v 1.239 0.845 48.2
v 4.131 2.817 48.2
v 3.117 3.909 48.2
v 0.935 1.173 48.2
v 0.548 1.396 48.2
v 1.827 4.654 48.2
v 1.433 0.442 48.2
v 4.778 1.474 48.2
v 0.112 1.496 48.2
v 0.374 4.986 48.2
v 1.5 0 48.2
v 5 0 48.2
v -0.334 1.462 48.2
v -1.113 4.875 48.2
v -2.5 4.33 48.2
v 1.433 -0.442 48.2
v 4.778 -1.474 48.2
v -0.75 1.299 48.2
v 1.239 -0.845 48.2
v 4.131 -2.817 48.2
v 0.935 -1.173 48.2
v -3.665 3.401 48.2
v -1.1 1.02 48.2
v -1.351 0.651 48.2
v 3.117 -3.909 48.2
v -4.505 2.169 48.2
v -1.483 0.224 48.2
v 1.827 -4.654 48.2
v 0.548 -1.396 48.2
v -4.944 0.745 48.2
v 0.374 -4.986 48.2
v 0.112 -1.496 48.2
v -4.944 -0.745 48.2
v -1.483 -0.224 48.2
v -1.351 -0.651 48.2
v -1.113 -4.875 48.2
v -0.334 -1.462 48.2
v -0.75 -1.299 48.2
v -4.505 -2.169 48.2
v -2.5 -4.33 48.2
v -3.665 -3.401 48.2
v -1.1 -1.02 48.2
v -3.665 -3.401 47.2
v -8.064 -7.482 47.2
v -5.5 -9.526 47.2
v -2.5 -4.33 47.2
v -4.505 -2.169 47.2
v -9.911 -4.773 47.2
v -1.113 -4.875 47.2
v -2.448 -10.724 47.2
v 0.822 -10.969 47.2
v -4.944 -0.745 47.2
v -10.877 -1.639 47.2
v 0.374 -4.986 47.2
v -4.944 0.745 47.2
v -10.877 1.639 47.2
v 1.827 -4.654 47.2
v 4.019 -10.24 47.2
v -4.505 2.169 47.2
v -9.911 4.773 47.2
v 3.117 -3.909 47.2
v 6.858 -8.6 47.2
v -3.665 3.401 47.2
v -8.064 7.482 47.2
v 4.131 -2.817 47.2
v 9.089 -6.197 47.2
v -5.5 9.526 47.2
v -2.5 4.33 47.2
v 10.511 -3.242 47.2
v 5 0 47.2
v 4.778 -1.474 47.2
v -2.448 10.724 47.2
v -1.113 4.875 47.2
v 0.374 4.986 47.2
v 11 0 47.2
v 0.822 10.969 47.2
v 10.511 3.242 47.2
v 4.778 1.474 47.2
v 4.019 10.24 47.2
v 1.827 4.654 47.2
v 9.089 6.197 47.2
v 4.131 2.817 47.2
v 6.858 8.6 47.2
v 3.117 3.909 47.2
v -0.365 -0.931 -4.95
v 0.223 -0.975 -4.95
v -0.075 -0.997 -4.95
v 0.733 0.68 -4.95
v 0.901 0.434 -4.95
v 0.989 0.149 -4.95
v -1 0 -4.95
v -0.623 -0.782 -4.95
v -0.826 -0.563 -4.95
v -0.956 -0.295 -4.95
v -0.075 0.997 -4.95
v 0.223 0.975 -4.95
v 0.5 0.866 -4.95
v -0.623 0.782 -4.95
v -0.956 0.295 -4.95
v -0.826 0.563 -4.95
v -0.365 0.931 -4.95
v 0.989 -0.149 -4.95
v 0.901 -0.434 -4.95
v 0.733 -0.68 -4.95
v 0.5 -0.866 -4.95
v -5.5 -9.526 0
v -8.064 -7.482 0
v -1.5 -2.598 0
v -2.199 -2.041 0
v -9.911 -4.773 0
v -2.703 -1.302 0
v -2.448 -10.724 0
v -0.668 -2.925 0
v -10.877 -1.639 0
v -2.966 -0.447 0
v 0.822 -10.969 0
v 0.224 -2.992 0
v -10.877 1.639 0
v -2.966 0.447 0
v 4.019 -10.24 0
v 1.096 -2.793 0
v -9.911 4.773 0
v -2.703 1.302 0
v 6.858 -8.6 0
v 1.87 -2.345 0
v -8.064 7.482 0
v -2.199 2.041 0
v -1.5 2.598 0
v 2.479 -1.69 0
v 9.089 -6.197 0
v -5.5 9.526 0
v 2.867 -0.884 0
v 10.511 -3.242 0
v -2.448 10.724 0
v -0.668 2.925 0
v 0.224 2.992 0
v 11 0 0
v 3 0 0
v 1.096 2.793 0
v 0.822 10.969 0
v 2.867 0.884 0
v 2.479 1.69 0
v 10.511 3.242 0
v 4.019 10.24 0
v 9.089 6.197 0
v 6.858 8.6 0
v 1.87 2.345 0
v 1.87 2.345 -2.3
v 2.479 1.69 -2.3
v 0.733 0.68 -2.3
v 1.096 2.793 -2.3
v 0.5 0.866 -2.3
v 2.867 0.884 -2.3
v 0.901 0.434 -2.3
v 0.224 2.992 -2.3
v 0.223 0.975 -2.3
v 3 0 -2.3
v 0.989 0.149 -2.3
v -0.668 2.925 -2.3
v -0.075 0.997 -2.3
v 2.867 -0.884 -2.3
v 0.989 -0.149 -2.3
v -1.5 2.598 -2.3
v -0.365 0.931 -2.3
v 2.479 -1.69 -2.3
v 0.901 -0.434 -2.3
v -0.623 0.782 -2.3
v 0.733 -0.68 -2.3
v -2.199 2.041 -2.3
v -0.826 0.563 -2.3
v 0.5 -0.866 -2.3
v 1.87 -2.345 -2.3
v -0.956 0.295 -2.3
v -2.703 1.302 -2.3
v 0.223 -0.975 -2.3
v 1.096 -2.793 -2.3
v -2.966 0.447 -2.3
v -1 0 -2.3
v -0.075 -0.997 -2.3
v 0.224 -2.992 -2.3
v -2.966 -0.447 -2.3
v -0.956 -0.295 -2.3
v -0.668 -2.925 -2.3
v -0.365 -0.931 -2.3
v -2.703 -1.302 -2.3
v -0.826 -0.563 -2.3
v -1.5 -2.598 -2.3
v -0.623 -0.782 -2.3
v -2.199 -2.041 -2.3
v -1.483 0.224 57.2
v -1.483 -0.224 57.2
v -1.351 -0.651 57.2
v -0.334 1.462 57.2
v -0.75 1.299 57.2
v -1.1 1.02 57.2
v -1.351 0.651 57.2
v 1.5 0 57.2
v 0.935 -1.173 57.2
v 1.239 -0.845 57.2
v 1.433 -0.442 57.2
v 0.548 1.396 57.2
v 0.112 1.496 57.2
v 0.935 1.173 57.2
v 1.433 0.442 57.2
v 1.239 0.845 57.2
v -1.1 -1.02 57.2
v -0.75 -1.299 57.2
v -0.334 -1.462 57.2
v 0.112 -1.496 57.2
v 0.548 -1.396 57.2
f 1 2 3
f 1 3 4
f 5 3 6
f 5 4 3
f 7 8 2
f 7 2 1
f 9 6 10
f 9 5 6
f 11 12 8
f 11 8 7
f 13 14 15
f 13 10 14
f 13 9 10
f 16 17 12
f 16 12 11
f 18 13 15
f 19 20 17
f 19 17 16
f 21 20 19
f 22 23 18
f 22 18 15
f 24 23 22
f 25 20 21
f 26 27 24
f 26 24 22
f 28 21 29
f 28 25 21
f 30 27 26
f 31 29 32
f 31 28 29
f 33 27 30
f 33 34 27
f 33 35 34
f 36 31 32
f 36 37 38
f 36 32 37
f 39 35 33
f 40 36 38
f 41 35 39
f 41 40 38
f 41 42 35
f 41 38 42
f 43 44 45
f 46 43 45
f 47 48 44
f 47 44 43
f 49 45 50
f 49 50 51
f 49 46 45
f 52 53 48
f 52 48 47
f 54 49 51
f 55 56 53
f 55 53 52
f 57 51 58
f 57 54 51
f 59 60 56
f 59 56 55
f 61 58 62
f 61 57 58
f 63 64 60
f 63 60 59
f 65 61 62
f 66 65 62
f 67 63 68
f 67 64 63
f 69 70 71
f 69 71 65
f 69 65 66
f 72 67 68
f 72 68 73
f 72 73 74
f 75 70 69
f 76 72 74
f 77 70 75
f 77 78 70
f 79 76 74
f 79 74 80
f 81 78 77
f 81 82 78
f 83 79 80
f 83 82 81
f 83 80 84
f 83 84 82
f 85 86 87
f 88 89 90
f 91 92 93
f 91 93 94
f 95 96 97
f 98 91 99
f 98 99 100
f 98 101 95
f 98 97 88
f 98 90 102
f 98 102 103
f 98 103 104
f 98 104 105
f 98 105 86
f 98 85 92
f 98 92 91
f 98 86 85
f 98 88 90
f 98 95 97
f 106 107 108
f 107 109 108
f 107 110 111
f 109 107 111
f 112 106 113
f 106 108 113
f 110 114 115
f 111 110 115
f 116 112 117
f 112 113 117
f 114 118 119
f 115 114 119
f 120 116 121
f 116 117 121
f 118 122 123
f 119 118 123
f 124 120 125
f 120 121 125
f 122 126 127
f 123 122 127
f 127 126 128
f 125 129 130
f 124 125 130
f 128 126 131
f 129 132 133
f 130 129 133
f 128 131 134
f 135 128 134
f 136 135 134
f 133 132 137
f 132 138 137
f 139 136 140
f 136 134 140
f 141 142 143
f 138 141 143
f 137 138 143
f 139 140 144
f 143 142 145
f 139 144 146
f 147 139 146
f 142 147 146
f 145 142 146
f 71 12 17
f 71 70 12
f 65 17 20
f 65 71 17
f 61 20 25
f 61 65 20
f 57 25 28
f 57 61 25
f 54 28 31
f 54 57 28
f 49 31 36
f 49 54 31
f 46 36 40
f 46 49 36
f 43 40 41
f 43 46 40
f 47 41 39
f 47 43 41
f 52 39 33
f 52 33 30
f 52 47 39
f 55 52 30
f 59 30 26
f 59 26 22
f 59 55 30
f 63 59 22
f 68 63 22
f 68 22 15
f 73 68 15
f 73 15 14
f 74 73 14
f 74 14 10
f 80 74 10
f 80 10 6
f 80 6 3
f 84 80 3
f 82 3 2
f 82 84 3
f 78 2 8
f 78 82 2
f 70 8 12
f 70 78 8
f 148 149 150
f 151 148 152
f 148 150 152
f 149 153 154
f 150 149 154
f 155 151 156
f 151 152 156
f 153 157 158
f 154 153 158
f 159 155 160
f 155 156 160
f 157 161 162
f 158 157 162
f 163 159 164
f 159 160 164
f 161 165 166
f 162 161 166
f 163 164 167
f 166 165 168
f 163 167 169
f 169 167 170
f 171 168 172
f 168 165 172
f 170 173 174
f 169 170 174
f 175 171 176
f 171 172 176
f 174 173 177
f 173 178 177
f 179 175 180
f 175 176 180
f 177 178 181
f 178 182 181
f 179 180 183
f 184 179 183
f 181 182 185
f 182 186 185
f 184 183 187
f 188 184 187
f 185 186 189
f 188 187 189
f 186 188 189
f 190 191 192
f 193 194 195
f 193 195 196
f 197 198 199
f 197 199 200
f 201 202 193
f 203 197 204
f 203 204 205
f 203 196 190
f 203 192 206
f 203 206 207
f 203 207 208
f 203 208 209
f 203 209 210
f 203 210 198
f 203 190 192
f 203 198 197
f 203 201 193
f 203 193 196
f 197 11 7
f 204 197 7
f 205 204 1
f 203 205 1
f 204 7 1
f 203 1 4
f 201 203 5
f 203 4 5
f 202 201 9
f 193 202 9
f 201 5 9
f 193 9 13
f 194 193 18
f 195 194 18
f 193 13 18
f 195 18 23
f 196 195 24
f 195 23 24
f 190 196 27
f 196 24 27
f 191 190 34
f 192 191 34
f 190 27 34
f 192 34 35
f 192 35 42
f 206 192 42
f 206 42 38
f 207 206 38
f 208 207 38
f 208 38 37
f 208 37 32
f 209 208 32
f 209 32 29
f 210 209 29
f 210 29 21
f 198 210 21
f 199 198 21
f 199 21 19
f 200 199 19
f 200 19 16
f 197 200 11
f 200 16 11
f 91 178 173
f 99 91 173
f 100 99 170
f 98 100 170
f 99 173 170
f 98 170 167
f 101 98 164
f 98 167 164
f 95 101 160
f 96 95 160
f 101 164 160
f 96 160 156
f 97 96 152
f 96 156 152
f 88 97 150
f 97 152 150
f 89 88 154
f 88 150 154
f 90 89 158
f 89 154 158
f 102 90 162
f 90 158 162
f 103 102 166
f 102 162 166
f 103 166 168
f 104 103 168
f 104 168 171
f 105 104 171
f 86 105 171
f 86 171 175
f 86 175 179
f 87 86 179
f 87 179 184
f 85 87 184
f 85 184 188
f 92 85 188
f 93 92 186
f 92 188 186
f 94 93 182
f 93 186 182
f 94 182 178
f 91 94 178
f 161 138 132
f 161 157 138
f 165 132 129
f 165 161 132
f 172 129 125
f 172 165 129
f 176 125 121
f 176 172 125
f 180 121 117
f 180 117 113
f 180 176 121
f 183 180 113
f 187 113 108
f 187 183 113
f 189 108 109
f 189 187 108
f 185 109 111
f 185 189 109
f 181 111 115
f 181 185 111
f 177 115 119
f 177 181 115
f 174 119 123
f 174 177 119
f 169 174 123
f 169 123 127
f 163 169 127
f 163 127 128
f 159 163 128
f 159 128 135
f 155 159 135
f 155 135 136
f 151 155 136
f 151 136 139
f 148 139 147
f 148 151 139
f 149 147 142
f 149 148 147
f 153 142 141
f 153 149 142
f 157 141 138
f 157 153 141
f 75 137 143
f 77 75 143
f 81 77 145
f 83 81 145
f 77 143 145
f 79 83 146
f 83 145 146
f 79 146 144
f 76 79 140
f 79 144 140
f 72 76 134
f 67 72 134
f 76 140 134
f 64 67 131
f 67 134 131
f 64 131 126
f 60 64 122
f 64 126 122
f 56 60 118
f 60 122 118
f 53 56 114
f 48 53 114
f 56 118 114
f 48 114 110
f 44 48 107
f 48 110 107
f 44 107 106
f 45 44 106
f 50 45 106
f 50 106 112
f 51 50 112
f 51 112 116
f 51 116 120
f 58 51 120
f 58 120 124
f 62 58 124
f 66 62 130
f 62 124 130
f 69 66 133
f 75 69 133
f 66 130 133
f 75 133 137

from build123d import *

# Parameters (mm, degrees)
SKETCH1_R           = 11
BOSS_EXTRUDE1_DEPTH = 47.2
SKETCH2_W           = 1
SKETCH2_H           = 5
SKETCH3_W           = 2.3
SKETCH3_H           = 3
SKETCH4_R           = 1.5
BOSS_EXTRUDE2_DEPTH = 9
SKETCH5_R           = 1
BOSS_EXTRUDE3_DEPTH = 2.65


with BuildPart() as part:
    # Sketch1 → Boss-Extrude1 (new body)
    with BuildSketch(Plane.XY):
        Circle(SKETCH1_R)
    extrude(amount=BOSS_EXTRUDE1_DEPTH)

    # Sketch2 → Revolve1 (revolve)
    with BuildSketch(Plane(origin=(0, 0, 0), x_dir=(0, 0, -1), z_dir=(1, 0, 0)), mode=Mode.PRIVATE) as revolve1_sk:
        with Locations((-47.7, 2.5)):
            Rectangle(SKETCH2_W, SKETCH2_H)
    revolve(revolve1_sk.sketch.rotate(Axis((0, 0, 47.2), (0, 0, -1)), 90), axis=Axis((0, 0, 47.2), (0, 0, -1)))

    # Sketch3 → Revolve2 (revolve)
    with BuildSketch(Plane(origin=(0, 0, 0), x_dir=(0, 0, -1), z_dir=(1, 0, 0)), mode=Mode.PRIVATE) as revolve2_sk:
        with Locations((1.15, 1.5)):
            Rectangle(SKETCH3_W, SKETCH3_H)
    revolve(revolve2_sk.sketch.rotate(Axis((0, 0, 47.2), (0, 0, -1)), 90), axis=Axis((0, 0, 47.2), (0, 0, -1)))

    # Sketch4 → Boss-Extrude2 (add)
    with BuildSketch(Plane.XY.offset(48.2)):
        Circle(SKETCH4_R)
    extrude(amount=BOSS_EXTRUDE2_DEPTH)

    # Sketch5 → Boss-Extrude3 (add)
    with BuildSketch(Plane(origin=(0, 0, -2.3), x_dir=(-1, 0, 0), z_dir=(0, 0, -1))):
        Circle(SKETCH5_R)
    extrude(amount=BOSS_EXTRUDE3_DEPTH)


solid = part.part
